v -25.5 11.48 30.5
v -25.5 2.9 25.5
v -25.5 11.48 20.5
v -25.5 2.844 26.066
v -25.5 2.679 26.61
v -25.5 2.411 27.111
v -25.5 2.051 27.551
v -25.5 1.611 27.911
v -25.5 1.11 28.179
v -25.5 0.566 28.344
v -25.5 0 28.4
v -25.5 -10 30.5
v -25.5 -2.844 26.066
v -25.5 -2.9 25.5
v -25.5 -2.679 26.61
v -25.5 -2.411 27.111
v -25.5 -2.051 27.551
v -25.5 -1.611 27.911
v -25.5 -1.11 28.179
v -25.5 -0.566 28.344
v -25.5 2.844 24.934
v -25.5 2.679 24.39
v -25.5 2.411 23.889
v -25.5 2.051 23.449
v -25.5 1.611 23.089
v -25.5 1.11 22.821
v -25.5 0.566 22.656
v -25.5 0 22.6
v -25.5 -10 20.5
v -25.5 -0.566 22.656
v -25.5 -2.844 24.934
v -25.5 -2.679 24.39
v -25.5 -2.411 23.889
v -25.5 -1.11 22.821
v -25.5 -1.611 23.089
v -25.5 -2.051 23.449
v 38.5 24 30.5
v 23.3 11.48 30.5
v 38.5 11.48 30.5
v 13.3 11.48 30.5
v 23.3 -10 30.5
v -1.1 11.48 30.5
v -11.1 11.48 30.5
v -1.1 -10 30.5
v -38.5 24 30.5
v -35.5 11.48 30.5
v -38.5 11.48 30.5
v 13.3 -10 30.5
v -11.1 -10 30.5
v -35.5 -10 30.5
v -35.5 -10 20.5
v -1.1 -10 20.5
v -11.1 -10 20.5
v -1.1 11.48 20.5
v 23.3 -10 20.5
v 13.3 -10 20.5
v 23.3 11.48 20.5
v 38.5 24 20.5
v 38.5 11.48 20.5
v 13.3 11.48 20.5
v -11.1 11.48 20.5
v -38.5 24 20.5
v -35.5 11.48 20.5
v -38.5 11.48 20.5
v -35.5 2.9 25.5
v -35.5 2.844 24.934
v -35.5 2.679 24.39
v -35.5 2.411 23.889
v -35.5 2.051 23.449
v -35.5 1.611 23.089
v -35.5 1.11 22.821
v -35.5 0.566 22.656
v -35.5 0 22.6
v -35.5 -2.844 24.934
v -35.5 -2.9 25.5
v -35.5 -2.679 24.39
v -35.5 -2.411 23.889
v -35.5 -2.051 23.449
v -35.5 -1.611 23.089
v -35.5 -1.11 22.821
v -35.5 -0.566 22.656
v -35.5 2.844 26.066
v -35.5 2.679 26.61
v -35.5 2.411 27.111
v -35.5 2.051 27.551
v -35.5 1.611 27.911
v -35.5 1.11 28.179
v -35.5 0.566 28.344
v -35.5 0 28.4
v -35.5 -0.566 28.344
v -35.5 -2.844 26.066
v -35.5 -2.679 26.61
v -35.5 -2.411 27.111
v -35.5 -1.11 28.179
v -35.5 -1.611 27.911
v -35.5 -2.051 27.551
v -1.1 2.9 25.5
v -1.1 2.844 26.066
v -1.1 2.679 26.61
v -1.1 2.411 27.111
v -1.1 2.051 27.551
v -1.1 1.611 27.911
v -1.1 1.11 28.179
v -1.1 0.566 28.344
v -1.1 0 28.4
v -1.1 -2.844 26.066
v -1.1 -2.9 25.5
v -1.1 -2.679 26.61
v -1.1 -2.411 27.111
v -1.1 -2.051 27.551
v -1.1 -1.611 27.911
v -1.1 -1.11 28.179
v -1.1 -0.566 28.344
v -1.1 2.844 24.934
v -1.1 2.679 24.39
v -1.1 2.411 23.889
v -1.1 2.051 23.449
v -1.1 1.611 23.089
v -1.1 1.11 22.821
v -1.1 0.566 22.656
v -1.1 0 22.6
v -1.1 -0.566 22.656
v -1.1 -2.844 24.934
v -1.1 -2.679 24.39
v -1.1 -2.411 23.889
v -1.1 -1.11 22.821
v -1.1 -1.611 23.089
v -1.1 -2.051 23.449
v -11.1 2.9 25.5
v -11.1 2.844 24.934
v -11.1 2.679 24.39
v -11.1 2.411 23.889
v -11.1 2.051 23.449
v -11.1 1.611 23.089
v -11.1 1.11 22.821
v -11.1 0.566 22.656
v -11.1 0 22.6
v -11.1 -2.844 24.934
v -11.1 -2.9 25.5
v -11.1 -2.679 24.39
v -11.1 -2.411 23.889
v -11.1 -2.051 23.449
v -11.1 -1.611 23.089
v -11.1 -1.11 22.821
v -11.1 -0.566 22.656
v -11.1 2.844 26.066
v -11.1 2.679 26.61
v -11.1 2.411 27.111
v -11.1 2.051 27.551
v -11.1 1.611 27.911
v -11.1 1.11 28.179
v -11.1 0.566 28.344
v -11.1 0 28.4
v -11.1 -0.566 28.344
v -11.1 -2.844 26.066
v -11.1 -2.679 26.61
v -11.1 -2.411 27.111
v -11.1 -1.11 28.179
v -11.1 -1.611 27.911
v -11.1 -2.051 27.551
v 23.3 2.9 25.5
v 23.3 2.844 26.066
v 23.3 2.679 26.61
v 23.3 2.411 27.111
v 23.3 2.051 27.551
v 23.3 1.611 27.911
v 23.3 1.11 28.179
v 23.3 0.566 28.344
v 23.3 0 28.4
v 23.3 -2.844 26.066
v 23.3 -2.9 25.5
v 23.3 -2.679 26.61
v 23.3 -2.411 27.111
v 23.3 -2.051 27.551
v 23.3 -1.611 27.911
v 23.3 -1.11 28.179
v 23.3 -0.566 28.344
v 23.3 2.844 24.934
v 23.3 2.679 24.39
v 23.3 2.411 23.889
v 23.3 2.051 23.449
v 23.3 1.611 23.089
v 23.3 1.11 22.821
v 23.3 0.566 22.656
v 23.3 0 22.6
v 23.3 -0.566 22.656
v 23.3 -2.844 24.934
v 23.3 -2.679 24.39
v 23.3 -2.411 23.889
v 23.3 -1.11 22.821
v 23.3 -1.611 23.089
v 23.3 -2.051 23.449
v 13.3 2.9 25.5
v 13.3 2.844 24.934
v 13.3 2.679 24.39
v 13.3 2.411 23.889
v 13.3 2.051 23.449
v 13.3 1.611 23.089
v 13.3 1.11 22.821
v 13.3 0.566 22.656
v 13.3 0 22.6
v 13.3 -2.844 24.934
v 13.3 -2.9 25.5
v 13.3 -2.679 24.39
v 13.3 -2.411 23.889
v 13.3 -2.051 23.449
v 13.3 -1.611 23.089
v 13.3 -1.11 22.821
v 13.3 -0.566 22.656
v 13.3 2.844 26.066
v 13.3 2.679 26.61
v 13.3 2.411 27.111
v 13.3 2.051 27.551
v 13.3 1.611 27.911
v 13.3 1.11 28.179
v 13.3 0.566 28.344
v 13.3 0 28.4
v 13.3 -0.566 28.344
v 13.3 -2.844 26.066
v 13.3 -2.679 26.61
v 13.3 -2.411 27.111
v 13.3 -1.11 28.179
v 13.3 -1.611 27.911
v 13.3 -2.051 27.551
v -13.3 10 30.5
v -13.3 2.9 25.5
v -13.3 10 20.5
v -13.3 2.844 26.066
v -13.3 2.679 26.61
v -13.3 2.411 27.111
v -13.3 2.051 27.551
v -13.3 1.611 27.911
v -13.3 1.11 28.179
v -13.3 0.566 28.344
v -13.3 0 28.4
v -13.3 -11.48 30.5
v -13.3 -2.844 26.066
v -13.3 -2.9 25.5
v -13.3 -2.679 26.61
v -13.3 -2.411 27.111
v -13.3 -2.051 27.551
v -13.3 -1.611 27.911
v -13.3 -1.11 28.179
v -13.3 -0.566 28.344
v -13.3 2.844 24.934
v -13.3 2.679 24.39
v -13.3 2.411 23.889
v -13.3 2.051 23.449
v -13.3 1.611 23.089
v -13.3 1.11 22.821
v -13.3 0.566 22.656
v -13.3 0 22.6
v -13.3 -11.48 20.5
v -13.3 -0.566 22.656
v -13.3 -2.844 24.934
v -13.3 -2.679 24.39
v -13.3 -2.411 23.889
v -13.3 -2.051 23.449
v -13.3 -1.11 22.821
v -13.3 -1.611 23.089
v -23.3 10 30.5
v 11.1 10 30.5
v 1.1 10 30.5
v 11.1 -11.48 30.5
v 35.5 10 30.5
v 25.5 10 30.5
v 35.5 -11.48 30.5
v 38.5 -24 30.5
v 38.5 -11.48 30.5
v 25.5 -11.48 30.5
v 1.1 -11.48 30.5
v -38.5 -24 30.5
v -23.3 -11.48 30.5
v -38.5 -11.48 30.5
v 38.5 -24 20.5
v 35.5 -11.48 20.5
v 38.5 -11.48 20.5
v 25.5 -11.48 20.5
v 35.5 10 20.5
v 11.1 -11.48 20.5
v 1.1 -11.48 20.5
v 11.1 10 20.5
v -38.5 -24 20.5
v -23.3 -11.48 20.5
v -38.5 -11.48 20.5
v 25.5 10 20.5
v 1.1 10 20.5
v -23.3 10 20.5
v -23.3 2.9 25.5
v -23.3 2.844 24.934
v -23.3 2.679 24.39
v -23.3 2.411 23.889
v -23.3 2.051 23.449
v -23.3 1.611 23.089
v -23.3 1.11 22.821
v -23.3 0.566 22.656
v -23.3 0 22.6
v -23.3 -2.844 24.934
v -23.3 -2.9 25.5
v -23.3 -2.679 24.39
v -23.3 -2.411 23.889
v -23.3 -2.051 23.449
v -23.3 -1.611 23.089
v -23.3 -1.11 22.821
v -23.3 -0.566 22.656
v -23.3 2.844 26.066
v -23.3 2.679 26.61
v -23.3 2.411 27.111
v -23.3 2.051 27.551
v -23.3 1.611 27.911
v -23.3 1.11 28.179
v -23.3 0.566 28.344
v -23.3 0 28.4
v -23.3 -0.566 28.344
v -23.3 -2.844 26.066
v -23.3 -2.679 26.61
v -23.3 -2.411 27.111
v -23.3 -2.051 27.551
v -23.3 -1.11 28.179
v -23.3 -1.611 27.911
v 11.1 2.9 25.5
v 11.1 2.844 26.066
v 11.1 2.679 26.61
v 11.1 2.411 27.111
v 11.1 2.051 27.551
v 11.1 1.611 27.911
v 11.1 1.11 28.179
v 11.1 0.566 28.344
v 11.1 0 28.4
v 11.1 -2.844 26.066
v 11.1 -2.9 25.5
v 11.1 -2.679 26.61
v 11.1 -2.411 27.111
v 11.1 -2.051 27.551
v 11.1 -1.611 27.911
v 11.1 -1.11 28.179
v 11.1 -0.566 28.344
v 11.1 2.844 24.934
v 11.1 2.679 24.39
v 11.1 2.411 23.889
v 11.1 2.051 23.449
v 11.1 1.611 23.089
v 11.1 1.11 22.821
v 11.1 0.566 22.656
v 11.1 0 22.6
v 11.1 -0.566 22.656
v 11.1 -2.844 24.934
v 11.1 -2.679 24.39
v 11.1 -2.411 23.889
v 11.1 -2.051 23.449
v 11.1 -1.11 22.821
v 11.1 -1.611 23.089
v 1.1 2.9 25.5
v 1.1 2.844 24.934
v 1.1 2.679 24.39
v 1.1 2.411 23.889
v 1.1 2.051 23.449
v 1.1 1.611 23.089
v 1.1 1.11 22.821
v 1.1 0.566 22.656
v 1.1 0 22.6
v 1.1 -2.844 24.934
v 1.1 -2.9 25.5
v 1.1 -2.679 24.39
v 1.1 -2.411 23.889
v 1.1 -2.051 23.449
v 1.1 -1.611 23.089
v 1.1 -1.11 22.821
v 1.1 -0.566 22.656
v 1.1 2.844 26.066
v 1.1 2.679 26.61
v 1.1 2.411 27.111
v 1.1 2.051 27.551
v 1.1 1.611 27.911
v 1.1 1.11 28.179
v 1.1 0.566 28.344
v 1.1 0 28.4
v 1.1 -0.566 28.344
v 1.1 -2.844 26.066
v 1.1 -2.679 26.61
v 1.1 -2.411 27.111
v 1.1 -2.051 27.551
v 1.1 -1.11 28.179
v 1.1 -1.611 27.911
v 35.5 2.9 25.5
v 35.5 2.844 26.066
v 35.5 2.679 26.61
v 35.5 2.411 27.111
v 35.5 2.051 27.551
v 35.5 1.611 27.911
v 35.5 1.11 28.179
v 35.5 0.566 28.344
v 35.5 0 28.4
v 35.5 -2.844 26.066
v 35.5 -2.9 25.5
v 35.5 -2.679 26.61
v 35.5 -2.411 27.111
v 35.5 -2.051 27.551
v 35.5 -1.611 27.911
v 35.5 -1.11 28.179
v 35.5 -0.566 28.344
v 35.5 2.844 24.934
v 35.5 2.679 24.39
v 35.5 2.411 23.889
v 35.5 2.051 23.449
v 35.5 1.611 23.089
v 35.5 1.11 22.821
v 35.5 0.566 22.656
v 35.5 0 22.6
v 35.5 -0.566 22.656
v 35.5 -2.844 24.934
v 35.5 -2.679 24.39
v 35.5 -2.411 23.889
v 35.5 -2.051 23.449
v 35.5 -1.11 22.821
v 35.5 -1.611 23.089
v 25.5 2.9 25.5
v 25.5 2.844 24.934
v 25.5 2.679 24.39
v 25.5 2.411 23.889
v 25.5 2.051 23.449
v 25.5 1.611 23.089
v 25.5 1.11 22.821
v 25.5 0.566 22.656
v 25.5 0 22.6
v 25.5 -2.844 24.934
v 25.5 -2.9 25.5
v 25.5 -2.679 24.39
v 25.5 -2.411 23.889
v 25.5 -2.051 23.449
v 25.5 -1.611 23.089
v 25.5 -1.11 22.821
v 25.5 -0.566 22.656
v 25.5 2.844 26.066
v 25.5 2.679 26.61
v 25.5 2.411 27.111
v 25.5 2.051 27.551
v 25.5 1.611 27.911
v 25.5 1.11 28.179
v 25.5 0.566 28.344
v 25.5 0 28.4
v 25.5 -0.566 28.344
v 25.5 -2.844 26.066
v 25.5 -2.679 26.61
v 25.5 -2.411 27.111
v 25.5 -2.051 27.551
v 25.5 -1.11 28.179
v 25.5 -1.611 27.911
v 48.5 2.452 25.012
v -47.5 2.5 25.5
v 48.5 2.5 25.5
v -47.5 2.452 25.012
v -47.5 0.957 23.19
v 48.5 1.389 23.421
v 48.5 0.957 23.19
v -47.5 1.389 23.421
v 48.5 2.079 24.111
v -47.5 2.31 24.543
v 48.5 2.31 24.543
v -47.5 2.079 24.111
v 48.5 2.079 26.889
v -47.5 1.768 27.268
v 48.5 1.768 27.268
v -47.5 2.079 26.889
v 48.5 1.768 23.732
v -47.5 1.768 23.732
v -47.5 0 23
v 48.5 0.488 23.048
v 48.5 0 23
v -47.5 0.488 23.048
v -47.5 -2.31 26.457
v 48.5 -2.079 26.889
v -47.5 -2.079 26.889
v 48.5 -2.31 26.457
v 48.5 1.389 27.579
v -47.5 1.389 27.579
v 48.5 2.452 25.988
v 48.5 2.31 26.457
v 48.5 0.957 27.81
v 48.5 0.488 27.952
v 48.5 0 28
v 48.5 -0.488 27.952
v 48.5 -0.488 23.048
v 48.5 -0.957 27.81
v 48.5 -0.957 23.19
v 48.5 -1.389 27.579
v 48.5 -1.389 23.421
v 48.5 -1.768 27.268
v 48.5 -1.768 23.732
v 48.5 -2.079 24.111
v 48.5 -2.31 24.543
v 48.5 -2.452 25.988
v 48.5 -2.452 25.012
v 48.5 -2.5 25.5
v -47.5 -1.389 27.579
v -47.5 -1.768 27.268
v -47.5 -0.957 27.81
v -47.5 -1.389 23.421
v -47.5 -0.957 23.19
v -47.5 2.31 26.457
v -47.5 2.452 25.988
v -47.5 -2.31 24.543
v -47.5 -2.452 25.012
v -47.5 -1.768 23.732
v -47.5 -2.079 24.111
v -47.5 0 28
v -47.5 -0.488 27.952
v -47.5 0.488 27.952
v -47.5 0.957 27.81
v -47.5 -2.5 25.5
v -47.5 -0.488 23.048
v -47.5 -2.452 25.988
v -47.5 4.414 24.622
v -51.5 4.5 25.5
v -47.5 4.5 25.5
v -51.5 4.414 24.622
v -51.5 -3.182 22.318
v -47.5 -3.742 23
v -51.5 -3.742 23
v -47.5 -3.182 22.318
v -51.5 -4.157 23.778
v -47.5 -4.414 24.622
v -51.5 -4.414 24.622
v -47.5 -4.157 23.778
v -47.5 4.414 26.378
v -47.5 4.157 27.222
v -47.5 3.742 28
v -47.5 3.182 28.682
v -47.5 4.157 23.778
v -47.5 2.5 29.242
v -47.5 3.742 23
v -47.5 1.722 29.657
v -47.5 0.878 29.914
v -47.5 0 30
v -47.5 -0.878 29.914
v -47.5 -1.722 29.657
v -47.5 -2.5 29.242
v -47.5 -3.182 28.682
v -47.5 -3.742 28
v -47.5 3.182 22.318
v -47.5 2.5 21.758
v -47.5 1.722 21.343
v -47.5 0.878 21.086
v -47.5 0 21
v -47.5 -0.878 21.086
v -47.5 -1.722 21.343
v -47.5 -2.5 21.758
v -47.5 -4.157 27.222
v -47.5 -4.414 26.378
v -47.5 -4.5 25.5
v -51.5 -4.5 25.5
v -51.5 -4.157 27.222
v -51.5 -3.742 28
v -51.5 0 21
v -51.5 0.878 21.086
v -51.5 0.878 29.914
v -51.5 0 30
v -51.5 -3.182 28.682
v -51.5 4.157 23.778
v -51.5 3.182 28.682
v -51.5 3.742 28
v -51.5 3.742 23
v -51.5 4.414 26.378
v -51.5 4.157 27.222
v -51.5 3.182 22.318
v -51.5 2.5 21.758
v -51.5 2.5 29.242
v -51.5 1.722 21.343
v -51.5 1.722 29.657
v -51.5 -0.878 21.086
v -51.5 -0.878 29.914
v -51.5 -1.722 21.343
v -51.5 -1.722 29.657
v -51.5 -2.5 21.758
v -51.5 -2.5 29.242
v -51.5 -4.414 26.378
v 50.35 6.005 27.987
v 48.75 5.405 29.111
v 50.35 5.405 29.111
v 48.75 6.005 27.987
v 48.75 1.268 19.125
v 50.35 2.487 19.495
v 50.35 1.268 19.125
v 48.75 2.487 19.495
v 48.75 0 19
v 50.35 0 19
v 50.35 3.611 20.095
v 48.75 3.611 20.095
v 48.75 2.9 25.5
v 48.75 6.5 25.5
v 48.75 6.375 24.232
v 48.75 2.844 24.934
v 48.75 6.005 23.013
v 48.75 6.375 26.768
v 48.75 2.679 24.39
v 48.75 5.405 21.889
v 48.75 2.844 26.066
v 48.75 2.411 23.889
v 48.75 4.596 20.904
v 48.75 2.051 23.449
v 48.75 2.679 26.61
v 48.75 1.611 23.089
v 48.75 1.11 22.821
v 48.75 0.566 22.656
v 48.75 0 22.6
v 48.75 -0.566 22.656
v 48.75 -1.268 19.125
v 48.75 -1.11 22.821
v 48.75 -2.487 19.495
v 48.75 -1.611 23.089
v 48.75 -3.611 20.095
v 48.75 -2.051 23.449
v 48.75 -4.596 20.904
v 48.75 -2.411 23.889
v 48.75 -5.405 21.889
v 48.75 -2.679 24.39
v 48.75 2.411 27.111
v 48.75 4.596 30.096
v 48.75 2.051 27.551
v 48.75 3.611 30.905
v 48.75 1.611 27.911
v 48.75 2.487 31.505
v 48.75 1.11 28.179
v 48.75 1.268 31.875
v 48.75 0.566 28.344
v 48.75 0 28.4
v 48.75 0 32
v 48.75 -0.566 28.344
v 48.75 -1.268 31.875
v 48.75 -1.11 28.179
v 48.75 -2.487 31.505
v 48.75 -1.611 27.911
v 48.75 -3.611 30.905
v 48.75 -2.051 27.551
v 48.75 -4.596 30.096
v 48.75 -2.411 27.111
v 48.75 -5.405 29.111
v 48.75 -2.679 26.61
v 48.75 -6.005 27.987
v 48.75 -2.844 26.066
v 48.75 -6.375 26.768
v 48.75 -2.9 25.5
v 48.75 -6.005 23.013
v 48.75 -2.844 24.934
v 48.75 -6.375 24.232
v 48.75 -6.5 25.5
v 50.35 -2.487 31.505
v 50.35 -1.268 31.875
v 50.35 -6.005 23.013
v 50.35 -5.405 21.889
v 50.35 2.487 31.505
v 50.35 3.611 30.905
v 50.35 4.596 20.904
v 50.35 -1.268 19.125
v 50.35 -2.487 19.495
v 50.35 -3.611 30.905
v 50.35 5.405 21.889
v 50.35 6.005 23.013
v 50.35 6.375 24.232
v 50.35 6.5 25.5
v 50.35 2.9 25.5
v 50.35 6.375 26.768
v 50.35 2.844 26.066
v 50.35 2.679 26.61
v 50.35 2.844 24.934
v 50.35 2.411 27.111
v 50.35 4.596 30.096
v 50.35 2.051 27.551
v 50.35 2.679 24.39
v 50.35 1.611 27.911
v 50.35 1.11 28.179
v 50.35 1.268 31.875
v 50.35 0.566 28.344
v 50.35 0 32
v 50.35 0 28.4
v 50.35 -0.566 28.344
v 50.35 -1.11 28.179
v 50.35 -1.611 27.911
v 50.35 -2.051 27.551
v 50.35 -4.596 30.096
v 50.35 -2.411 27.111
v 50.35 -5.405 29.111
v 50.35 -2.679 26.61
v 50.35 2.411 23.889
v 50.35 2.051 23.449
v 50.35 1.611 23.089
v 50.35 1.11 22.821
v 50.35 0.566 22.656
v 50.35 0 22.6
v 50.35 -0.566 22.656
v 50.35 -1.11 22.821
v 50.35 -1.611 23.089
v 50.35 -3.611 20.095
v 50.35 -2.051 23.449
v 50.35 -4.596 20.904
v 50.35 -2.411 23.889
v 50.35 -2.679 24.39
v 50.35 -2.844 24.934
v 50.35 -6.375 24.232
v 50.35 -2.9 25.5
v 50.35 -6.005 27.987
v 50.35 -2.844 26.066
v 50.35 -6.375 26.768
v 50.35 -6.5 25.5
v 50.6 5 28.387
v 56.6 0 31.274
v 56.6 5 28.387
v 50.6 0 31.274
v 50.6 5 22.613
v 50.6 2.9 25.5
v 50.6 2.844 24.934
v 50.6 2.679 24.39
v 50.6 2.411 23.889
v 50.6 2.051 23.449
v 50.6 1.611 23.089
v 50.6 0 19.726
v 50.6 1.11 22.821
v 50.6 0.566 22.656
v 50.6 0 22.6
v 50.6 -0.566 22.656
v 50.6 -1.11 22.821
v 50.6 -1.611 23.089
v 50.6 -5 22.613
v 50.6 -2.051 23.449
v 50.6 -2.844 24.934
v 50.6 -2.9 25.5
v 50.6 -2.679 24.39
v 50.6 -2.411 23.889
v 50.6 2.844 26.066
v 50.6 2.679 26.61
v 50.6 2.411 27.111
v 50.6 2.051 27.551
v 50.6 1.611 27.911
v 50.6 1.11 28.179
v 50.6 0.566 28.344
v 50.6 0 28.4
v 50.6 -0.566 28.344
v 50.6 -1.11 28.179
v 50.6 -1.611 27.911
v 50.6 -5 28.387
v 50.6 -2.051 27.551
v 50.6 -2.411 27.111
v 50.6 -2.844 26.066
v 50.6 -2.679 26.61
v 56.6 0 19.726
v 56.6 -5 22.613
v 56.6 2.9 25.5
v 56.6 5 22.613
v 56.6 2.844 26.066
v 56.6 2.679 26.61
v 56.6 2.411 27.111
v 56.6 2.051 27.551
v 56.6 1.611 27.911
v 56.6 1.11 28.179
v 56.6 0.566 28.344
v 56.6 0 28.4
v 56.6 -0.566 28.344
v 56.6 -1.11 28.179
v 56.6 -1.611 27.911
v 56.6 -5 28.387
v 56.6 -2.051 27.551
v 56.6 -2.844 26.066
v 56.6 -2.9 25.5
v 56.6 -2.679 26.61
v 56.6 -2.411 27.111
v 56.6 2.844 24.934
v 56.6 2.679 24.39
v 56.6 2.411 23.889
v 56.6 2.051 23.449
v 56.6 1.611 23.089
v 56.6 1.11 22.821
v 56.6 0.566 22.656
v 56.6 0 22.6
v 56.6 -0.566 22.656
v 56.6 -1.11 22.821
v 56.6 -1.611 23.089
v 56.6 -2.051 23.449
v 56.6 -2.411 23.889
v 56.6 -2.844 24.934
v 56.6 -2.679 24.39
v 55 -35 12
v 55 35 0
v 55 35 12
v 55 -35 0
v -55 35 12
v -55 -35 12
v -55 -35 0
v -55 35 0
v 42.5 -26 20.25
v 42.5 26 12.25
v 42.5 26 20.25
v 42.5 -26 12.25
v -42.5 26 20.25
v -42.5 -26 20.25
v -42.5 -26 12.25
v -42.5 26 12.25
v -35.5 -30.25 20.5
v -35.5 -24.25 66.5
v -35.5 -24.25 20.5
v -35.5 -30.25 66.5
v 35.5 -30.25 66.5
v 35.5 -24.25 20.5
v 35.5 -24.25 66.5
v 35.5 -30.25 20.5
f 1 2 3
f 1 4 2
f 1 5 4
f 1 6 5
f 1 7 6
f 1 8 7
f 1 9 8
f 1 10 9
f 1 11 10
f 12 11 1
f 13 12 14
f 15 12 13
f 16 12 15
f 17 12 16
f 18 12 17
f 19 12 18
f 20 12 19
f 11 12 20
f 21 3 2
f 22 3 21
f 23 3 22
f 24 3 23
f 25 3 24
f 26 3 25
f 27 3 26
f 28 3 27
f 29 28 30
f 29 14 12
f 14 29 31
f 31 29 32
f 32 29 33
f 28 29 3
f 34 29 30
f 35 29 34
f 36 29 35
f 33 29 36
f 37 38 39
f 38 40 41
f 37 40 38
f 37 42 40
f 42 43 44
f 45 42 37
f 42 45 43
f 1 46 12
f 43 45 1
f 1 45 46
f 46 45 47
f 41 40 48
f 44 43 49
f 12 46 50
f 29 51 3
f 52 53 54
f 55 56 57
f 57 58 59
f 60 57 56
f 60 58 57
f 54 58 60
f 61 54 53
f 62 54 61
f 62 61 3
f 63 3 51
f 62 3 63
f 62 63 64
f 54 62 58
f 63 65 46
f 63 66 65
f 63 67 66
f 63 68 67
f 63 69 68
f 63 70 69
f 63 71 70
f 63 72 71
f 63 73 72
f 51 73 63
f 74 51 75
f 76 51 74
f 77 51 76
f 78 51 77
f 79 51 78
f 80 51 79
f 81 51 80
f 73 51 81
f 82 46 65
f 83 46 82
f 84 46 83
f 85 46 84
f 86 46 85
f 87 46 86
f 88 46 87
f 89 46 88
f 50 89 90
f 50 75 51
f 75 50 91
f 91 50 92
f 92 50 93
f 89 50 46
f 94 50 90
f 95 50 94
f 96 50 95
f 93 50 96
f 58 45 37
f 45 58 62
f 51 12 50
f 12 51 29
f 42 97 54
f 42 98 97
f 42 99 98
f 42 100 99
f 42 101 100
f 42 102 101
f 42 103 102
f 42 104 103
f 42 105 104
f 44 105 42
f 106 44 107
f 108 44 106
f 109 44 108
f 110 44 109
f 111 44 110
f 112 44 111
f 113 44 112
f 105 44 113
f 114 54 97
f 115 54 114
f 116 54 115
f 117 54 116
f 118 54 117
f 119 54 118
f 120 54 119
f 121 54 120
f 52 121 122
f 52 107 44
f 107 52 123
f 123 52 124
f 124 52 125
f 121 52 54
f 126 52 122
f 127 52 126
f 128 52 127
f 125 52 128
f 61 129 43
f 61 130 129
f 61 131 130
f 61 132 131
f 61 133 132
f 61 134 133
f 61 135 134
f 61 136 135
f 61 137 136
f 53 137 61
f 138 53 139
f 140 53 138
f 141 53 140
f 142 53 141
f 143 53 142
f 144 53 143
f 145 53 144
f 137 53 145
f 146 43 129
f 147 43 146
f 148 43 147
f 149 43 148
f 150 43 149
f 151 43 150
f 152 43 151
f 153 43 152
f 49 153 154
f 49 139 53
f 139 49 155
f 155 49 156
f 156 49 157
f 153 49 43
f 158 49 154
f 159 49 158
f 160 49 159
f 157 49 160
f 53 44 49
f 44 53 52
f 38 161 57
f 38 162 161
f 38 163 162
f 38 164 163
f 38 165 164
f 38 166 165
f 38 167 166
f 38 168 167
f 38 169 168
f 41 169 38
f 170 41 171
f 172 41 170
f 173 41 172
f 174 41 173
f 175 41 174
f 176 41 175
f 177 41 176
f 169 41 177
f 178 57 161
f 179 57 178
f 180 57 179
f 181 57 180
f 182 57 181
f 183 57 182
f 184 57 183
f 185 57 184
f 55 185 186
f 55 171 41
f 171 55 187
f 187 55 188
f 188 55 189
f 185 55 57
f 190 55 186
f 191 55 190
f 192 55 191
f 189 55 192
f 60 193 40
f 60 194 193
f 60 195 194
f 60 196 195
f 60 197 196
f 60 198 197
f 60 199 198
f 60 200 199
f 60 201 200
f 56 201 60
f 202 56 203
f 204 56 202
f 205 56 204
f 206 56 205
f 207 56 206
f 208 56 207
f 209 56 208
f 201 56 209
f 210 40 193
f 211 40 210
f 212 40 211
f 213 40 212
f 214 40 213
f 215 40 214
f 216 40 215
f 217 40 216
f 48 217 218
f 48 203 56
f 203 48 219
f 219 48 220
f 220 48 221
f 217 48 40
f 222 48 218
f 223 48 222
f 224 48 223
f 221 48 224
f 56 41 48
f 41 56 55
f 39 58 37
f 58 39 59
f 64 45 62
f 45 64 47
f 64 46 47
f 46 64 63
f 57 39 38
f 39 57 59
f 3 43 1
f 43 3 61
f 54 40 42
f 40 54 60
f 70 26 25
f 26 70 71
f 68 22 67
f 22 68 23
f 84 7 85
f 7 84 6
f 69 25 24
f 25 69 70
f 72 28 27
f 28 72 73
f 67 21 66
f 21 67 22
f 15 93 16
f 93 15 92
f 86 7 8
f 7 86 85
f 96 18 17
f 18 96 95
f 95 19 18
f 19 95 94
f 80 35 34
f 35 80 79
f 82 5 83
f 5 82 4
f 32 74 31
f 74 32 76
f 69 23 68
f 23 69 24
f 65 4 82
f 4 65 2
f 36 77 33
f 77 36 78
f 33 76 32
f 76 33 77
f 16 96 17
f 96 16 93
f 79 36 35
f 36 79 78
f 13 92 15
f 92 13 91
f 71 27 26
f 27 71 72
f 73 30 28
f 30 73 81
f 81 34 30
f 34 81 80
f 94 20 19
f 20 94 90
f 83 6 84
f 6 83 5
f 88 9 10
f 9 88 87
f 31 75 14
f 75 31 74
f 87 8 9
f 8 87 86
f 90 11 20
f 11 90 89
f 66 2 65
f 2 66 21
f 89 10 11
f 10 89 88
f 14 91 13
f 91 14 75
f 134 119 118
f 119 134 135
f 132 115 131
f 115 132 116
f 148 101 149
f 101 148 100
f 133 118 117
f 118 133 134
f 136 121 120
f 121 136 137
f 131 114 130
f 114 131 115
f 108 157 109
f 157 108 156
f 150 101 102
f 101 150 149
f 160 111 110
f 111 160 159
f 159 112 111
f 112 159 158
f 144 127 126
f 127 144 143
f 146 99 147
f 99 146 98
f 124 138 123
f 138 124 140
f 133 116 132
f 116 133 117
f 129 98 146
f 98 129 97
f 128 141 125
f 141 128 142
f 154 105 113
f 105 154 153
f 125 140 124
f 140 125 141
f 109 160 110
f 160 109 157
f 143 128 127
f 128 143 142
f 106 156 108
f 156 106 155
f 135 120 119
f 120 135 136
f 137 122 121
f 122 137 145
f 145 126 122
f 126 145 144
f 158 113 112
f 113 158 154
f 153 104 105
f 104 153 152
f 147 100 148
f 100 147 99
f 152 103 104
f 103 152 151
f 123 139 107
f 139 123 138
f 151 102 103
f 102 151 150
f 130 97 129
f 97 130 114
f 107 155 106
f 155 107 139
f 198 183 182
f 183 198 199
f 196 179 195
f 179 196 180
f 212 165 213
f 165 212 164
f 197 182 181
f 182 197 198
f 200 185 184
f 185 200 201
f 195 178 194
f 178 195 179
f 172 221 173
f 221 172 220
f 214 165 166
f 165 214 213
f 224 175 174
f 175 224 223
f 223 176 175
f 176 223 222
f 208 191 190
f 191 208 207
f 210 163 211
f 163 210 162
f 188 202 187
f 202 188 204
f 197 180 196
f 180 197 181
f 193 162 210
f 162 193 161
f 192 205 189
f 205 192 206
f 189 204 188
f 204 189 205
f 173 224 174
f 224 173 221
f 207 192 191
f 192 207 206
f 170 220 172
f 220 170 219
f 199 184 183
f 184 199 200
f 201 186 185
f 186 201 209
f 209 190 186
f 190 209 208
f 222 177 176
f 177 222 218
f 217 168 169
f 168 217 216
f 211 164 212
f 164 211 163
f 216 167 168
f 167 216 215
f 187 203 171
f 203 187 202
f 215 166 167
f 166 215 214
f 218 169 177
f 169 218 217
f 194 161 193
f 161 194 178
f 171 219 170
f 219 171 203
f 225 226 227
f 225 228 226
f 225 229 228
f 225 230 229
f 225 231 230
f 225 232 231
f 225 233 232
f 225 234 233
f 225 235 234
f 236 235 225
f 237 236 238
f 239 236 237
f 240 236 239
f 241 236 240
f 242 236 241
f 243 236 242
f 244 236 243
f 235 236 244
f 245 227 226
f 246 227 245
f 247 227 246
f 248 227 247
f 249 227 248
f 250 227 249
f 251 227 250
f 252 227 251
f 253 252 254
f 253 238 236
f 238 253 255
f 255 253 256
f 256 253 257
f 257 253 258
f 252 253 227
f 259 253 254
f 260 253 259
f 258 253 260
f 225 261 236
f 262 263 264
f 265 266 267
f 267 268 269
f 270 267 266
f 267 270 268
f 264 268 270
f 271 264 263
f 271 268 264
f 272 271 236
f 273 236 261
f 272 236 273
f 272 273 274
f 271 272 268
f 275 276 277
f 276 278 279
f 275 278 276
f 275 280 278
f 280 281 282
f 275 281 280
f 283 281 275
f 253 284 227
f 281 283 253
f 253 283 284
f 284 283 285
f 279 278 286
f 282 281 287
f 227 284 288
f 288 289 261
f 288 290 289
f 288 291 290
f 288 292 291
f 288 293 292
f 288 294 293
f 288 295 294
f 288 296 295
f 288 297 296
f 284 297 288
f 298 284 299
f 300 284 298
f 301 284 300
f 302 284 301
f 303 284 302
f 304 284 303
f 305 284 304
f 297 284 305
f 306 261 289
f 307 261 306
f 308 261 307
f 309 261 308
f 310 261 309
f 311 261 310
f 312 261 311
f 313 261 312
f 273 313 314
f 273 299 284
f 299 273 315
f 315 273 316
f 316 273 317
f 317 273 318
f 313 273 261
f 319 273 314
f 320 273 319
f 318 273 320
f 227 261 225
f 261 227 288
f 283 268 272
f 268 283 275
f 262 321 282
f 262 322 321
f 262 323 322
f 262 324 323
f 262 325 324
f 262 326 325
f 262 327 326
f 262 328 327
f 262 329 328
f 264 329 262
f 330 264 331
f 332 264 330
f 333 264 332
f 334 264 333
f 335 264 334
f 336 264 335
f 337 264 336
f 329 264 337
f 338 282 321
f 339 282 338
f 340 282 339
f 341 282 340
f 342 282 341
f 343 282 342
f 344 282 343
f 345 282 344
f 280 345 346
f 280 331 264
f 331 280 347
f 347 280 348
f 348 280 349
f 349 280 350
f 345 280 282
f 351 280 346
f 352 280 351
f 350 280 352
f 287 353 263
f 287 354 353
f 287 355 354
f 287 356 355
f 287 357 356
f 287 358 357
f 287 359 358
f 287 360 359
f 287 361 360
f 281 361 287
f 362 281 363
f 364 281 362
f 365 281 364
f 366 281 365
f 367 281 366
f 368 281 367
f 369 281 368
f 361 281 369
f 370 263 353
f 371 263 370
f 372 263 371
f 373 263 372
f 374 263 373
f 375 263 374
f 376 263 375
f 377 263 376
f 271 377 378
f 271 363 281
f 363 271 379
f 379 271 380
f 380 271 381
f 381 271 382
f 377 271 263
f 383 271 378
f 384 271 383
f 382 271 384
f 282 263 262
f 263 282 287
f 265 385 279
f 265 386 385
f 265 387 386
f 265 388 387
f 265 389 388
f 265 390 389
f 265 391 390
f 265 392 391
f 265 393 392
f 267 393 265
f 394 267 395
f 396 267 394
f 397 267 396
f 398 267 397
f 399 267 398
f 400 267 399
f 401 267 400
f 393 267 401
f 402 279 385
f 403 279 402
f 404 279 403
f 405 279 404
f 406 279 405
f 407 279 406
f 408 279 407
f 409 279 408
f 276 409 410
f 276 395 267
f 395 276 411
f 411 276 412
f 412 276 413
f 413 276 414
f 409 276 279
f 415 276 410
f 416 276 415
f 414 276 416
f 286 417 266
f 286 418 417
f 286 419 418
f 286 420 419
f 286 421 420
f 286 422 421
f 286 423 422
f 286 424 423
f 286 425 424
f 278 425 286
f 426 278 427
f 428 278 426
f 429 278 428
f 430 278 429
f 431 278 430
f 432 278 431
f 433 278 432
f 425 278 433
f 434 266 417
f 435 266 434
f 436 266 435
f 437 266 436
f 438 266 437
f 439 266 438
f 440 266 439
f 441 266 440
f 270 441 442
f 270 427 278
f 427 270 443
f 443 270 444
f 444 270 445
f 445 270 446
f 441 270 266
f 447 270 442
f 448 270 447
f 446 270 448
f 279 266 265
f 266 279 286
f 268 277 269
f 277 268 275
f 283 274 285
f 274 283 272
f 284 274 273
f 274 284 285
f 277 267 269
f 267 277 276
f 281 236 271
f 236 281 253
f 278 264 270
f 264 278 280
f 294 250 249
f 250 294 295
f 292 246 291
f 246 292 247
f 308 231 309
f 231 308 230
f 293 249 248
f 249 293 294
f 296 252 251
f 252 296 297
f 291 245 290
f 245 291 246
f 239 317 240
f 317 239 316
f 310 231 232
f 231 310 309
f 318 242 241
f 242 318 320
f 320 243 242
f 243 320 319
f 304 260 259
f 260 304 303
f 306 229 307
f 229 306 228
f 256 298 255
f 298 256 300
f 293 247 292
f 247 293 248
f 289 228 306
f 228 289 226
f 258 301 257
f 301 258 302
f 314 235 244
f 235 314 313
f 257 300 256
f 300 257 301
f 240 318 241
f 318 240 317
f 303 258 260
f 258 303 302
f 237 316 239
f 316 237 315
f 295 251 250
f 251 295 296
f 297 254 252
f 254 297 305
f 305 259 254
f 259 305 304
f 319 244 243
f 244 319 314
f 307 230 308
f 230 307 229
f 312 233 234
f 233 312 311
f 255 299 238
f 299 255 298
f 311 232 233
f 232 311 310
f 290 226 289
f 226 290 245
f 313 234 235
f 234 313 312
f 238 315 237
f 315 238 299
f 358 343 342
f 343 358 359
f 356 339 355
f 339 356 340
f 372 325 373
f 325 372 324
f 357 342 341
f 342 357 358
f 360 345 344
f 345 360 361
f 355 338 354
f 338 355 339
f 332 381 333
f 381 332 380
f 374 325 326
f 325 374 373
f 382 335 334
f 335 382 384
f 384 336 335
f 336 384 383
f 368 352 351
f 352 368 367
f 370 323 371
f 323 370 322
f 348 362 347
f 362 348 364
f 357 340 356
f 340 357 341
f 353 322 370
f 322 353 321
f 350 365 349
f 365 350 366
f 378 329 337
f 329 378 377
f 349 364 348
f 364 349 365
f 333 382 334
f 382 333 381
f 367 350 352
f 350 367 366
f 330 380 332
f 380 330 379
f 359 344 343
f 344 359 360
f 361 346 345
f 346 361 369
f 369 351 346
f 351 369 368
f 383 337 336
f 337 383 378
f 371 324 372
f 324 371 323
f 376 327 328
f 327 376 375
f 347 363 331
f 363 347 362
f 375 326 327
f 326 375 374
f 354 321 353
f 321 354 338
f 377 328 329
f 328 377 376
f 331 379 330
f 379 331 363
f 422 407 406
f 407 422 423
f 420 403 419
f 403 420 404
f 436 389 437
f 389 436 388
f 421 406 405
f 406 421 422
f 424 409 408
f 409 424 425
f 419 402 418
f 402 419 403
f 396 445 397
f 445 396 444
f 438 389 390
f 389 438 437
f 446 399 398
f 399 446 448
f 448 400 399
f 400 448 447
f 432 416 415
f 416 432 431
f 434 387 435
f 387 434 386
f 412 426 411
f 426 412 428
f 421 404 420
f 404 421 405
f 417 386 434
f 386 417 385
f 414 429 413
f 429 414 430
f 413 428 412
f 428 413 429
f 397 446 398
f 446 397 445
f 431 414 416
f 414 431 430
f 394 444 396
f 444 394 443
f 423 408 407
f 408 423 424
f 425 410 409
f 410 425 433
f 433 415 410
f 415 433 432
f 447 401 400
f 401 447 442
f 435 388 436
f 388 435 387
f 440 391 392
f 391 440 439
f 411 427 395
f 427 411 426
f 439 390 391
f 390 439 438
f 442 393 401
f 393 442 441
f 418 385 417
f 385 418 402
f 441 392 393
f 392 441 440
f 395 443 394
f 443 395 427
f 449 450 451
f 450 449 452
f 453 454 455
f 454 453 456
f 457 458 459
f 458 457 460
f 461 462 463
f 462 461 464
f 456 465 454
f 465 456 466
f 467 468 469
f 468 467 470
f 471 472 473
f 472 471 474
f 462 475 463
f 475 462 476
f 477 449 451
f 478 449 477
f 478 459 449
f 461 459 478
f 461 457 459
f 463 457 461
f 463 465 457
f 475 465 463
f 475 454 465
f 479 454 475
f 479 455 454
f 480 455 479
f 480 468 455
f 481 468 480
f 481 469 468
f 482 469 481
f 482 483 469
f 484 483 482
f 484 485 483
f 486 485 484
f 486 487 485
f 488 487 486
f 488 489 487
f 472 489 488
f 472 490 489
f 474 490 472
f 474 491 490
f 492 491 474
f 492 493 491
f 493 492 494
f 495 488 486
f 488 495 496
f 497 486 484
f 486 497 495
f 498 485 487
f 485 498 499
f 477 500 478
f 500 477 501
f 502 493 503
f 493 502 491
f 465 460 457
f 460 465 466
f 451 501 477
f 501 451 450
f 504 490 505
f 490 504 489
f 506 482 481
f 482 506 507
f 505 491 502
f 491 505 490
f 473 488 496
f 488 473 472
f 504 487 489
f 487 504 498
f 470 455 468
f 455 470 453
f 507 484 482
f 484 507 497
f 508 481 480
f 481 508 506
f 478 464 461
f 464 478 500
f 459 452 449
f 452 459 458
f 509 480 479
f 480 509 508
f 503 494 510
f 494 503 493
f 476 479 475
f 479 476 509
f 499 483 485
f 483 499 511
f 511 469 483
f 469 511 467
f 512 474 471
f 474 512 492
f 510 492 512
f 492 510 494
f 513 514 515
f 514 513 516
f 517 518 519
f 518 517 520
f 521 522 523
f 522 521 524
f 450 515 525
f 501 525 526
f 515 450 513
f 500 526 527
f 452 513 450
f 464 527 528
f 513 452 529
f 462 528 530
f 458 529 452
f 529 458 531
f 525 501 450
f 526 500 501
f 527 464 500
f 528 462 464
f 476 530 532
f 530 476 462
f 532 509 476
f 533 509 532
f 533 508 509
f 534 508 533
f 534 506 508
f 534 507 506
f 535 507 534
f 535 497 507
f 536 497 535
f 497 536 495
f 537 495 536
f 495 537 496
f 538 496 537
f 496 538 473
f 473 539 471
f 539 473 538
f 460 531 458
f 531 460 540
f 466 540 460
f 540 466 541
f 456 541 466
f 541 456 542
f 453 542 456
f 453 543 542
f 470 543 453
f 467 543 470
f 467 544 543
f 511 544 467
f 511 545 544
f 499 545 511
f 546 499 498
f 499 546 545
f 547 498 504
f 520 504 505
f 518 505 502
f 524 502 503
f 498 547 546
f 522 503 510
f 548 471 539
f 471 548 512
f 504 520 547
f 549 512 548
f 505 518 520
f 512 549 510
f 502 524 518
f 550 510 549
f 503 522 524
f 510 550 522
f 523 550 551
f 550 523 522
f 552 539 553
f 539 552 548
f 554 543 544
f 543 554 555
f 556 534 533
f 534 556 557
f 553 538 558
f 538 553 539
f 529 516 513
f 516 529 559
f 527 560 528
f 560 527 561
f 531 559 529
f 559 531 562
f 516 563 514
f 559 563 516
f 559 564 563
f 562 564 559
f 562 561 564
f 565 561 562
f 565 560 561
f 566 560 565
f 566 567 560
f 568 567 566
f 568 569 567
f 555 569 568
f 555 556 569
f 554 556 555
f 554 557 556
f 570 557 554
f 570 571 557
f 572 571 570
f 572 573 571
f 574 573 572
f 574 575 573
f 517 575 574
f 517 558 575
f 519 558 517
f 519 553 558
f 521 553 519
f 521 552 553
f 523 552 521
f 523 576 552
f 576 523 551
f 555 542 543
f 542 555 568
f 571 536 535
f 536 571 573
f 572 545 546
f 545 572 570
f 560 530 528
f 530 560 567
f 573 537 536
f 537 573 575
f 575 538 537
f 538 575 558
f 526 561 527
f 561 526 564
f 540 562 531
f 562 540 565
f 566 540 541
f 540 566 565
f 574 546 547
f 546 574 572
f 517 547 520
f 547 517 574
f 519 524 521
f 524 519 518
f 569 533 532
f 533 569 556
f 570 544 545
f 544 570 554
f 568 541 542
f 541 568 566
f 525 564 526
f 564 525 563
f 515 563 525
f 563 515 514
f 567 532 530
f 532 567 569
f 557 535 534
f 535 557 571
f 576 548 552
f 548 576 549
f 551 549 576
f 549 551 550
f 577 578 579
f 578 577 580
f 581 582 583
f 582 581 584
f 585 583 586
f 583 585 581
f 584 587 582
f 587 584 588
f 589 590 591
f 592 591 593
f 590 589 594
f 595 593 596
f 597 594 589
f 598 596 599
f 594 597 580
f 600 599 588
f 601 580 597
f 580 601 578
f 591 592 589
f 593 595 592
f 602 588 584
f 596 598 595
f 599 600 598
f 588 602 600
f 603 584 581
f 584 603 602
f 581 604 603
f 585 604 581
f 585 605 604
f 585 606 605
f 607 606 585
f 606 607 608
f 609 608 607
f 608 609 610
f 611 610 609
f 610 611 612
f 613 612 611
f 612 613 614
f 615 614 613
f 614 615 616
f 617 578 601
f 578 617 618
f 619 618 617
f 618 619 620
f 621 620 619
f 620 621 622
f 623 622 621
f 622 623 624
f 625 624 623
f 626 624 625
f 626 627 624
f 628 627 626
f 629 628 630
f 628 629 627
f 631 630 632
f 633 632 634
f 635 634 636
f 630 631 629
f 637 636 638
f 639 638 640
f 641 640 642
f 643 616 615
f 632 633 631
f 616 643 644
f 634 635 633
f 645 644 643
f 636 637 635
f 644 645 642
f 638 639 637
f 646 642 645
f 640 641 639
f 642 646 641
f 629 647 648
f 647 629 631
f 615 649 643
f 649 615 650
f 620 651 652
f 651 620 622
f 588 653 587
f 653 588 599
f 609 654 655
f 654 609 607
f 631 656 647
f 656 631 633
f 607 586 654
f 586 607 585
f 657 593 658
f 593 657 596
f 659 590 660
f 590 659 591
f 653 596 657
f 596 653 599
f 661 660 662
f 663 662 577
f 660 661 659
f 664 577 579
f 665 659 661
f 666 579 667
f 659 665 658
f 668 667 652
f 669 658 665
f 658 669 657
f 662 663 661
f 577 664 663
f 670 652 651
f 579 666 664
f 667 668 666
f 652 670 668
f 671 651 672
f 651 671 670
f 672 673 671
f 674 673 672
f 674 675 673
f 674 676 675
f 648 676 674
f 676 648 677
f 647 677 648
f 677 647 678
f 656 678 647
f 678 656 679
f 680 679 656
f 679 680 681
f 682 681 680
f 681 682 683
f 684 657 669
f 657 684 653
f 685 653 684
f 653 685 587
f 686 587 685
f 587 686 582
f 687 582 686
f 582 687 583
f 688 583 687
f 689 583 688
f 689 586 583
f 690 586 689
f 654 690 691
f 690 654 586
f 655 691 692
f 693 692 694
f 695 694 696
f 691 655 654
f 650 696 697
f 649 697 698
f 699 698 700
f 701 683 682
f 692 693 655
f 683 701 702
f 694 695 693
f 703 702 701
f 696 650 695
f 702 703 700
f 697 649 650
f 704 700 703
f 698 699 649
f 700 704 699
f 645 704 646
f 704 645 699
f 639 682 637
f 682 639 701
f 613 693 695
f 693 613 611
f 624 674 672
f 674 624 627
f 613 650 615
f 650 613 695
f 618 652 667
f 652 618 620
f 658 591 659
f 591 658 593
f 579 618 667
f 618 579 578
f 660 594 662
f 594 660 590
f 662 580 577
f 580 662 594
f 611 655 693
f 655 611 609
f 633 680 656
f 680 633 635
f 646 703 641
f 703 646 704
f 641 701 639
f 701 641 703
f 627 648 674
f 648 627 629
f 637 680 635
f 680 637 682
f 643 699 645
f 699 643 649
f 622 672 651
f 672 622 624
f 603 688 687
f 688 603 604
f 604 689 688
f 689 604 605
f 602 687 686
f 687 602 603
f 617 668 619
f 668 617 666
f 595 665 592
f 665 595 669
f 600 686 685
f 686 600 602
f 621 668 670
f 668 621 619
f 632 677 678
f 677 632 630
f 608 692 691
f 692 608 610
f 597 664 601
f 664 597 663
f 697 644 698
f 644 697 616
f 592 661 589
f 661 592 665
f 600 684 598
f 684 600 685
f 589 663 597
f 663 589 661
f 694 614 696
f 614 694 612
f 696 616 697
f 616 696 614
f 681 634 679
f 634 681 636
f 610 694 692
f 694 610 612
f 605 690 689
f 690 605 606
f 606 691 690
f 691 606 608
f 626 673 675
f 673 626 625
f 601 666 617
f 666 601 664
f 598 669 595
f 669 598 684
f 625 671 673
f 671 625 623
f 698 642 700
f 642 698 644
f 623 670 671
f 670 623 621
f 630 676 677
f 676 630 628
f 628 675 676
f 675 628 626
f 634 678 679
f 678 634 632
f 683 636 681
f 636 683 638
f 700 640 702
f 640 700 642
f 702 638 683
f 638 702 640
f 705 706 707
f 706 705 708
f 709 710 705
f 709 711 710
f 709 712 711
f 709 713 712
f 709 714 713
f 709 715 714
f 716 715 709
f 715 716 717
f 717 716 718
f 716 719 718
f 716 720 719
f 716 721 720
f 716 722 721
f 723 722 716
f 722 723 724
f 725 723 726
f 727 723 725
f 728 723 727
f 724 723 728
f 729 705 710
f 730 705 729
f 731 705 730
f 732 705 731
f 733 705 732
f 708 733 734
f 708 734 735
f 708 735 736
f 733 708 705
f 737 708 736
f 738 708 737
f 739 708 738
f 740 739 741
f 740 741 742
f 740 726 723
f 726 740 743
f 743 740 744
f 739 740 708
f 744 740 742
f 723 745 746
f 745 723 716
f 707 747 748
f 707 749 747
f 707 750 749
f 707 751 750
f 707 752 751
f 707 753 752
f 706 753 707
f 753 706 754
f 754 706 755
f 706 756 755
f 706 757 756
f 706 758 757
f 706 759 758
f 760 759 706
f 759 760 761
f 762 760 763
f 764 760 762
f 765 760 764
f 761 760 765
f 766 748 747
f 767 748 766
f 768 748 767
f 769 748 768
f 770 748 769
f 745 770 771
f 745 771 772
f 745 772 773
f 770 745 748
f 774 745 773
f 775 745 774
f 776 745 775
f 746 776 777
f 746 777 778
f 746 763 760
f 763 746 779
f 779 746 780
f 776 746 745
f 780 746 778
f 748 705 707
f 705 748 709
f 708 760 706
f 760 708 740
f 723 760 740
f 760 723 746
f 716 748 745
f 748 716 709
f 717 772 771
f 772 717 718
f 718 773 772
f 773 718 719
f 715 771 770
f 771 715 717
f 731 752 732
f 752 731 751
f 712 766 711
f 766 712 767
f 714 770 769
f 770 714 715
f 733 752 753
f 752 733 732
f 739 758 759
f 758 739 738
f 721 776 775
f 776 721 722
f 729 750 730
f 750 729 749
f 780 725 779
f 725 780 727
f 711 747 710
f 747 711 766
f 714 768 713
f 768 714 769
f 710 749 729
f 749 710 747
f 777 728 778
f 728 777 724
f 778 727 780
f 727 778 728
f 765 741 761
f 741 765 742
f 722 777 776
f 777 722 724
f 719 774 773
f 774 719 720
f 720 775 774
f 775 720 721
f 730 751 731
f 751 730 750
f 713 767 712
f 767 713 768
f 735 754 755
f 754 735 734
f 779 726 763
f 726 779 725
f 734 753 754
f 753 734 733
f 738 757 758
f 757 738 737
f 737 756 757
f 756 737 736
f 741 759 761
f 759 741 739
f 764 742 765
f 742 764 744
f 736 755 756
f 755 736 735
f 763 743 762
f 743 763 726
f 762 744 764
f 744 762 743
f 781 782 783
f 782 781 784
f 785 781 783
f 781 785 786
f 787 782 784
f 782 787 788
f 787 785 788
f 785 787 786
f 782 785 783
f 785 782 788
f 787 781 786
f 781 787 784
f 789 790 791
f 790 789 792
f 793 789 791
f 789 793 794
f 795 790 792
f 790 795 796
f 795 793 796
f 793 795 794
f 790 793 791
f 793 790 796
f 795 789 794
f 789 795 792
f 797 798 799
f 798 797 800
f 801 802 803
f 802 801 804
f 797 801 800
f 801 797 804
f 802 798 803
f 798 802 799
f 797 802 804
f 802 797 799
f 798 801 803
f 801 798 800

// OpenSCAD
$fn = 32;

// ------------------------------------------------------------------------
// Comb hinge with flap: leaf 77 x 24 mm, pin d5, flap 46 mm
// Every part is its own module, assembly() places every instance.
// ------------------------------------------------------------------------

// --- part 1 ---
module hinge_bed() {
  difference() {
    translate([-55, -35, 0]) cube([110, 70, 12]);
  }
}

// --- part 2 ---
module hinge_riser() {
  difference() {
    translate([-42.5, -26, 0]) cube([85, 52, 8]);
  }
}

// --- part 3 ---
module hinge_leaf_a() {
  difference() {
    union() {
      translate([-35.5, -10, -5]) cube([10, 34, 10]);
      translate([-11.1, -10, -5]) cube([10, 34, 10]);
      translate([13.3, -10, -5]) cube([10, 34, 10]);
      translate([-38.5, 11.48, -5]) cube([77, 12.52, 10]);
    }
    translate([-30.5, 0, 0]) rotate([0, 90, 0]) cylinder(h = 12, d = 5.8, center = true);
    translate([-6.1, 0, 0]) rotate([0, 90, 0]) cylinder(h = 12, d = 5.8, center = true);
    translate([18.3, 0, 0]) rotate([0, 90, 0]) cylinder(h = 12, d = 5.8, center = true);
  }
}

// --- part 4 ---
module hinge_leaf_b() {
  difference() {
    union() {
      translate([-23.3, -24, -5]) cube([10, 34, 10]);
      translate([1.1, -24, -5]) cube([10, 34, 10]);
      translate([25.5, -24, -5]) cube([10, 34, 10]);
      translate([-38.5, -24, -5]) cube([77, 12.52, 10]);
    }
    translate([-18.3, 0, 0]) rotate([0, 90, 0]) cylinder(h = 12, d = 5.8, center = true);
    translate([6.1, 0, 0]) rotate([0, 90, 0]) cylinder(h = 12, d = 5.8, center = true);
    translate([30.5, 0, 0]) rotate([0, 90, 0]) cylinder(h = 12, d = 5.8, center = true);
  }
}

// --- part 5 ---
module hinge_flap() {
  difference() {
    translate([-35.5, -23, 0]) cube([71, 46, 6]);
  }
}

// --- part 6 ---
module hinge_pin() {
  rotate([0, 90, 0]) cylinder(h = 97, d = 5, center = true);
  translate([-51.5, 0, 0]) rotate([0, 90, 0]) cylinder(h = 4, d = 9);
}

// --- part 7 ---
module pin_washer() {
  difference() {
      translate([0, 0, 0]) cylinder(h = 1.6, d = 13);
      translate([0, 0, -1]) cylinder(h = 3.6, d = 5.8);
    }
}

// --- part 8 ---
module pin_nut() {
  difference() {
    linear_extrude(height = 6) polygon(points = [[5.774, 0], [2.887, 5], [-2.887, 5], [-5.774, 0], [-2.887, -5], [2.887, -5]]);
    translate([0, 0, -1]) cylinder(h = 8, d = 5.8);
  }
}

// --- assembly ---
module assembly() {
  color([0.80, 0.24, 0.20]) translate([0, 0, 0]) rotate([0, 0, 0]) hinge_bed();
  color([0.20, 0.45, 0.75]) translate([0, 0, 12.25]) rotate([0, 0, 0]) hinge_riser();
  color([0.25, 0.62, 0.32]) translate([0, 0, 25.5]) rotate([0, 0, 0]) hinge_leaf_a();
  color([0.92, 0.70, 0.18]) translate([0, 0, 25.5]) rotate([0, 0, 0]) hinge_leaf_b();
  color([0.58, 0.35, 0.70]) translate([0, -24.25, 43.5]) rotate([90, 0, 0]) hinge_flap();
  color([0.16, 0.66, 0.66]) translate([0, 0, 25.5]) rotate([0, 0, 0]) hinge_pin();
  color([0.85, 0.48, 0.18]) translate([48.75, 0, 25.5]) rotate([0, 90, 0]) pin_washer();
  color([0.55, 0.60, 0.65]) translate([50.6, 0, 25.5]) rotate([0, 90, 0]) pin_nut();
}

assembly();
